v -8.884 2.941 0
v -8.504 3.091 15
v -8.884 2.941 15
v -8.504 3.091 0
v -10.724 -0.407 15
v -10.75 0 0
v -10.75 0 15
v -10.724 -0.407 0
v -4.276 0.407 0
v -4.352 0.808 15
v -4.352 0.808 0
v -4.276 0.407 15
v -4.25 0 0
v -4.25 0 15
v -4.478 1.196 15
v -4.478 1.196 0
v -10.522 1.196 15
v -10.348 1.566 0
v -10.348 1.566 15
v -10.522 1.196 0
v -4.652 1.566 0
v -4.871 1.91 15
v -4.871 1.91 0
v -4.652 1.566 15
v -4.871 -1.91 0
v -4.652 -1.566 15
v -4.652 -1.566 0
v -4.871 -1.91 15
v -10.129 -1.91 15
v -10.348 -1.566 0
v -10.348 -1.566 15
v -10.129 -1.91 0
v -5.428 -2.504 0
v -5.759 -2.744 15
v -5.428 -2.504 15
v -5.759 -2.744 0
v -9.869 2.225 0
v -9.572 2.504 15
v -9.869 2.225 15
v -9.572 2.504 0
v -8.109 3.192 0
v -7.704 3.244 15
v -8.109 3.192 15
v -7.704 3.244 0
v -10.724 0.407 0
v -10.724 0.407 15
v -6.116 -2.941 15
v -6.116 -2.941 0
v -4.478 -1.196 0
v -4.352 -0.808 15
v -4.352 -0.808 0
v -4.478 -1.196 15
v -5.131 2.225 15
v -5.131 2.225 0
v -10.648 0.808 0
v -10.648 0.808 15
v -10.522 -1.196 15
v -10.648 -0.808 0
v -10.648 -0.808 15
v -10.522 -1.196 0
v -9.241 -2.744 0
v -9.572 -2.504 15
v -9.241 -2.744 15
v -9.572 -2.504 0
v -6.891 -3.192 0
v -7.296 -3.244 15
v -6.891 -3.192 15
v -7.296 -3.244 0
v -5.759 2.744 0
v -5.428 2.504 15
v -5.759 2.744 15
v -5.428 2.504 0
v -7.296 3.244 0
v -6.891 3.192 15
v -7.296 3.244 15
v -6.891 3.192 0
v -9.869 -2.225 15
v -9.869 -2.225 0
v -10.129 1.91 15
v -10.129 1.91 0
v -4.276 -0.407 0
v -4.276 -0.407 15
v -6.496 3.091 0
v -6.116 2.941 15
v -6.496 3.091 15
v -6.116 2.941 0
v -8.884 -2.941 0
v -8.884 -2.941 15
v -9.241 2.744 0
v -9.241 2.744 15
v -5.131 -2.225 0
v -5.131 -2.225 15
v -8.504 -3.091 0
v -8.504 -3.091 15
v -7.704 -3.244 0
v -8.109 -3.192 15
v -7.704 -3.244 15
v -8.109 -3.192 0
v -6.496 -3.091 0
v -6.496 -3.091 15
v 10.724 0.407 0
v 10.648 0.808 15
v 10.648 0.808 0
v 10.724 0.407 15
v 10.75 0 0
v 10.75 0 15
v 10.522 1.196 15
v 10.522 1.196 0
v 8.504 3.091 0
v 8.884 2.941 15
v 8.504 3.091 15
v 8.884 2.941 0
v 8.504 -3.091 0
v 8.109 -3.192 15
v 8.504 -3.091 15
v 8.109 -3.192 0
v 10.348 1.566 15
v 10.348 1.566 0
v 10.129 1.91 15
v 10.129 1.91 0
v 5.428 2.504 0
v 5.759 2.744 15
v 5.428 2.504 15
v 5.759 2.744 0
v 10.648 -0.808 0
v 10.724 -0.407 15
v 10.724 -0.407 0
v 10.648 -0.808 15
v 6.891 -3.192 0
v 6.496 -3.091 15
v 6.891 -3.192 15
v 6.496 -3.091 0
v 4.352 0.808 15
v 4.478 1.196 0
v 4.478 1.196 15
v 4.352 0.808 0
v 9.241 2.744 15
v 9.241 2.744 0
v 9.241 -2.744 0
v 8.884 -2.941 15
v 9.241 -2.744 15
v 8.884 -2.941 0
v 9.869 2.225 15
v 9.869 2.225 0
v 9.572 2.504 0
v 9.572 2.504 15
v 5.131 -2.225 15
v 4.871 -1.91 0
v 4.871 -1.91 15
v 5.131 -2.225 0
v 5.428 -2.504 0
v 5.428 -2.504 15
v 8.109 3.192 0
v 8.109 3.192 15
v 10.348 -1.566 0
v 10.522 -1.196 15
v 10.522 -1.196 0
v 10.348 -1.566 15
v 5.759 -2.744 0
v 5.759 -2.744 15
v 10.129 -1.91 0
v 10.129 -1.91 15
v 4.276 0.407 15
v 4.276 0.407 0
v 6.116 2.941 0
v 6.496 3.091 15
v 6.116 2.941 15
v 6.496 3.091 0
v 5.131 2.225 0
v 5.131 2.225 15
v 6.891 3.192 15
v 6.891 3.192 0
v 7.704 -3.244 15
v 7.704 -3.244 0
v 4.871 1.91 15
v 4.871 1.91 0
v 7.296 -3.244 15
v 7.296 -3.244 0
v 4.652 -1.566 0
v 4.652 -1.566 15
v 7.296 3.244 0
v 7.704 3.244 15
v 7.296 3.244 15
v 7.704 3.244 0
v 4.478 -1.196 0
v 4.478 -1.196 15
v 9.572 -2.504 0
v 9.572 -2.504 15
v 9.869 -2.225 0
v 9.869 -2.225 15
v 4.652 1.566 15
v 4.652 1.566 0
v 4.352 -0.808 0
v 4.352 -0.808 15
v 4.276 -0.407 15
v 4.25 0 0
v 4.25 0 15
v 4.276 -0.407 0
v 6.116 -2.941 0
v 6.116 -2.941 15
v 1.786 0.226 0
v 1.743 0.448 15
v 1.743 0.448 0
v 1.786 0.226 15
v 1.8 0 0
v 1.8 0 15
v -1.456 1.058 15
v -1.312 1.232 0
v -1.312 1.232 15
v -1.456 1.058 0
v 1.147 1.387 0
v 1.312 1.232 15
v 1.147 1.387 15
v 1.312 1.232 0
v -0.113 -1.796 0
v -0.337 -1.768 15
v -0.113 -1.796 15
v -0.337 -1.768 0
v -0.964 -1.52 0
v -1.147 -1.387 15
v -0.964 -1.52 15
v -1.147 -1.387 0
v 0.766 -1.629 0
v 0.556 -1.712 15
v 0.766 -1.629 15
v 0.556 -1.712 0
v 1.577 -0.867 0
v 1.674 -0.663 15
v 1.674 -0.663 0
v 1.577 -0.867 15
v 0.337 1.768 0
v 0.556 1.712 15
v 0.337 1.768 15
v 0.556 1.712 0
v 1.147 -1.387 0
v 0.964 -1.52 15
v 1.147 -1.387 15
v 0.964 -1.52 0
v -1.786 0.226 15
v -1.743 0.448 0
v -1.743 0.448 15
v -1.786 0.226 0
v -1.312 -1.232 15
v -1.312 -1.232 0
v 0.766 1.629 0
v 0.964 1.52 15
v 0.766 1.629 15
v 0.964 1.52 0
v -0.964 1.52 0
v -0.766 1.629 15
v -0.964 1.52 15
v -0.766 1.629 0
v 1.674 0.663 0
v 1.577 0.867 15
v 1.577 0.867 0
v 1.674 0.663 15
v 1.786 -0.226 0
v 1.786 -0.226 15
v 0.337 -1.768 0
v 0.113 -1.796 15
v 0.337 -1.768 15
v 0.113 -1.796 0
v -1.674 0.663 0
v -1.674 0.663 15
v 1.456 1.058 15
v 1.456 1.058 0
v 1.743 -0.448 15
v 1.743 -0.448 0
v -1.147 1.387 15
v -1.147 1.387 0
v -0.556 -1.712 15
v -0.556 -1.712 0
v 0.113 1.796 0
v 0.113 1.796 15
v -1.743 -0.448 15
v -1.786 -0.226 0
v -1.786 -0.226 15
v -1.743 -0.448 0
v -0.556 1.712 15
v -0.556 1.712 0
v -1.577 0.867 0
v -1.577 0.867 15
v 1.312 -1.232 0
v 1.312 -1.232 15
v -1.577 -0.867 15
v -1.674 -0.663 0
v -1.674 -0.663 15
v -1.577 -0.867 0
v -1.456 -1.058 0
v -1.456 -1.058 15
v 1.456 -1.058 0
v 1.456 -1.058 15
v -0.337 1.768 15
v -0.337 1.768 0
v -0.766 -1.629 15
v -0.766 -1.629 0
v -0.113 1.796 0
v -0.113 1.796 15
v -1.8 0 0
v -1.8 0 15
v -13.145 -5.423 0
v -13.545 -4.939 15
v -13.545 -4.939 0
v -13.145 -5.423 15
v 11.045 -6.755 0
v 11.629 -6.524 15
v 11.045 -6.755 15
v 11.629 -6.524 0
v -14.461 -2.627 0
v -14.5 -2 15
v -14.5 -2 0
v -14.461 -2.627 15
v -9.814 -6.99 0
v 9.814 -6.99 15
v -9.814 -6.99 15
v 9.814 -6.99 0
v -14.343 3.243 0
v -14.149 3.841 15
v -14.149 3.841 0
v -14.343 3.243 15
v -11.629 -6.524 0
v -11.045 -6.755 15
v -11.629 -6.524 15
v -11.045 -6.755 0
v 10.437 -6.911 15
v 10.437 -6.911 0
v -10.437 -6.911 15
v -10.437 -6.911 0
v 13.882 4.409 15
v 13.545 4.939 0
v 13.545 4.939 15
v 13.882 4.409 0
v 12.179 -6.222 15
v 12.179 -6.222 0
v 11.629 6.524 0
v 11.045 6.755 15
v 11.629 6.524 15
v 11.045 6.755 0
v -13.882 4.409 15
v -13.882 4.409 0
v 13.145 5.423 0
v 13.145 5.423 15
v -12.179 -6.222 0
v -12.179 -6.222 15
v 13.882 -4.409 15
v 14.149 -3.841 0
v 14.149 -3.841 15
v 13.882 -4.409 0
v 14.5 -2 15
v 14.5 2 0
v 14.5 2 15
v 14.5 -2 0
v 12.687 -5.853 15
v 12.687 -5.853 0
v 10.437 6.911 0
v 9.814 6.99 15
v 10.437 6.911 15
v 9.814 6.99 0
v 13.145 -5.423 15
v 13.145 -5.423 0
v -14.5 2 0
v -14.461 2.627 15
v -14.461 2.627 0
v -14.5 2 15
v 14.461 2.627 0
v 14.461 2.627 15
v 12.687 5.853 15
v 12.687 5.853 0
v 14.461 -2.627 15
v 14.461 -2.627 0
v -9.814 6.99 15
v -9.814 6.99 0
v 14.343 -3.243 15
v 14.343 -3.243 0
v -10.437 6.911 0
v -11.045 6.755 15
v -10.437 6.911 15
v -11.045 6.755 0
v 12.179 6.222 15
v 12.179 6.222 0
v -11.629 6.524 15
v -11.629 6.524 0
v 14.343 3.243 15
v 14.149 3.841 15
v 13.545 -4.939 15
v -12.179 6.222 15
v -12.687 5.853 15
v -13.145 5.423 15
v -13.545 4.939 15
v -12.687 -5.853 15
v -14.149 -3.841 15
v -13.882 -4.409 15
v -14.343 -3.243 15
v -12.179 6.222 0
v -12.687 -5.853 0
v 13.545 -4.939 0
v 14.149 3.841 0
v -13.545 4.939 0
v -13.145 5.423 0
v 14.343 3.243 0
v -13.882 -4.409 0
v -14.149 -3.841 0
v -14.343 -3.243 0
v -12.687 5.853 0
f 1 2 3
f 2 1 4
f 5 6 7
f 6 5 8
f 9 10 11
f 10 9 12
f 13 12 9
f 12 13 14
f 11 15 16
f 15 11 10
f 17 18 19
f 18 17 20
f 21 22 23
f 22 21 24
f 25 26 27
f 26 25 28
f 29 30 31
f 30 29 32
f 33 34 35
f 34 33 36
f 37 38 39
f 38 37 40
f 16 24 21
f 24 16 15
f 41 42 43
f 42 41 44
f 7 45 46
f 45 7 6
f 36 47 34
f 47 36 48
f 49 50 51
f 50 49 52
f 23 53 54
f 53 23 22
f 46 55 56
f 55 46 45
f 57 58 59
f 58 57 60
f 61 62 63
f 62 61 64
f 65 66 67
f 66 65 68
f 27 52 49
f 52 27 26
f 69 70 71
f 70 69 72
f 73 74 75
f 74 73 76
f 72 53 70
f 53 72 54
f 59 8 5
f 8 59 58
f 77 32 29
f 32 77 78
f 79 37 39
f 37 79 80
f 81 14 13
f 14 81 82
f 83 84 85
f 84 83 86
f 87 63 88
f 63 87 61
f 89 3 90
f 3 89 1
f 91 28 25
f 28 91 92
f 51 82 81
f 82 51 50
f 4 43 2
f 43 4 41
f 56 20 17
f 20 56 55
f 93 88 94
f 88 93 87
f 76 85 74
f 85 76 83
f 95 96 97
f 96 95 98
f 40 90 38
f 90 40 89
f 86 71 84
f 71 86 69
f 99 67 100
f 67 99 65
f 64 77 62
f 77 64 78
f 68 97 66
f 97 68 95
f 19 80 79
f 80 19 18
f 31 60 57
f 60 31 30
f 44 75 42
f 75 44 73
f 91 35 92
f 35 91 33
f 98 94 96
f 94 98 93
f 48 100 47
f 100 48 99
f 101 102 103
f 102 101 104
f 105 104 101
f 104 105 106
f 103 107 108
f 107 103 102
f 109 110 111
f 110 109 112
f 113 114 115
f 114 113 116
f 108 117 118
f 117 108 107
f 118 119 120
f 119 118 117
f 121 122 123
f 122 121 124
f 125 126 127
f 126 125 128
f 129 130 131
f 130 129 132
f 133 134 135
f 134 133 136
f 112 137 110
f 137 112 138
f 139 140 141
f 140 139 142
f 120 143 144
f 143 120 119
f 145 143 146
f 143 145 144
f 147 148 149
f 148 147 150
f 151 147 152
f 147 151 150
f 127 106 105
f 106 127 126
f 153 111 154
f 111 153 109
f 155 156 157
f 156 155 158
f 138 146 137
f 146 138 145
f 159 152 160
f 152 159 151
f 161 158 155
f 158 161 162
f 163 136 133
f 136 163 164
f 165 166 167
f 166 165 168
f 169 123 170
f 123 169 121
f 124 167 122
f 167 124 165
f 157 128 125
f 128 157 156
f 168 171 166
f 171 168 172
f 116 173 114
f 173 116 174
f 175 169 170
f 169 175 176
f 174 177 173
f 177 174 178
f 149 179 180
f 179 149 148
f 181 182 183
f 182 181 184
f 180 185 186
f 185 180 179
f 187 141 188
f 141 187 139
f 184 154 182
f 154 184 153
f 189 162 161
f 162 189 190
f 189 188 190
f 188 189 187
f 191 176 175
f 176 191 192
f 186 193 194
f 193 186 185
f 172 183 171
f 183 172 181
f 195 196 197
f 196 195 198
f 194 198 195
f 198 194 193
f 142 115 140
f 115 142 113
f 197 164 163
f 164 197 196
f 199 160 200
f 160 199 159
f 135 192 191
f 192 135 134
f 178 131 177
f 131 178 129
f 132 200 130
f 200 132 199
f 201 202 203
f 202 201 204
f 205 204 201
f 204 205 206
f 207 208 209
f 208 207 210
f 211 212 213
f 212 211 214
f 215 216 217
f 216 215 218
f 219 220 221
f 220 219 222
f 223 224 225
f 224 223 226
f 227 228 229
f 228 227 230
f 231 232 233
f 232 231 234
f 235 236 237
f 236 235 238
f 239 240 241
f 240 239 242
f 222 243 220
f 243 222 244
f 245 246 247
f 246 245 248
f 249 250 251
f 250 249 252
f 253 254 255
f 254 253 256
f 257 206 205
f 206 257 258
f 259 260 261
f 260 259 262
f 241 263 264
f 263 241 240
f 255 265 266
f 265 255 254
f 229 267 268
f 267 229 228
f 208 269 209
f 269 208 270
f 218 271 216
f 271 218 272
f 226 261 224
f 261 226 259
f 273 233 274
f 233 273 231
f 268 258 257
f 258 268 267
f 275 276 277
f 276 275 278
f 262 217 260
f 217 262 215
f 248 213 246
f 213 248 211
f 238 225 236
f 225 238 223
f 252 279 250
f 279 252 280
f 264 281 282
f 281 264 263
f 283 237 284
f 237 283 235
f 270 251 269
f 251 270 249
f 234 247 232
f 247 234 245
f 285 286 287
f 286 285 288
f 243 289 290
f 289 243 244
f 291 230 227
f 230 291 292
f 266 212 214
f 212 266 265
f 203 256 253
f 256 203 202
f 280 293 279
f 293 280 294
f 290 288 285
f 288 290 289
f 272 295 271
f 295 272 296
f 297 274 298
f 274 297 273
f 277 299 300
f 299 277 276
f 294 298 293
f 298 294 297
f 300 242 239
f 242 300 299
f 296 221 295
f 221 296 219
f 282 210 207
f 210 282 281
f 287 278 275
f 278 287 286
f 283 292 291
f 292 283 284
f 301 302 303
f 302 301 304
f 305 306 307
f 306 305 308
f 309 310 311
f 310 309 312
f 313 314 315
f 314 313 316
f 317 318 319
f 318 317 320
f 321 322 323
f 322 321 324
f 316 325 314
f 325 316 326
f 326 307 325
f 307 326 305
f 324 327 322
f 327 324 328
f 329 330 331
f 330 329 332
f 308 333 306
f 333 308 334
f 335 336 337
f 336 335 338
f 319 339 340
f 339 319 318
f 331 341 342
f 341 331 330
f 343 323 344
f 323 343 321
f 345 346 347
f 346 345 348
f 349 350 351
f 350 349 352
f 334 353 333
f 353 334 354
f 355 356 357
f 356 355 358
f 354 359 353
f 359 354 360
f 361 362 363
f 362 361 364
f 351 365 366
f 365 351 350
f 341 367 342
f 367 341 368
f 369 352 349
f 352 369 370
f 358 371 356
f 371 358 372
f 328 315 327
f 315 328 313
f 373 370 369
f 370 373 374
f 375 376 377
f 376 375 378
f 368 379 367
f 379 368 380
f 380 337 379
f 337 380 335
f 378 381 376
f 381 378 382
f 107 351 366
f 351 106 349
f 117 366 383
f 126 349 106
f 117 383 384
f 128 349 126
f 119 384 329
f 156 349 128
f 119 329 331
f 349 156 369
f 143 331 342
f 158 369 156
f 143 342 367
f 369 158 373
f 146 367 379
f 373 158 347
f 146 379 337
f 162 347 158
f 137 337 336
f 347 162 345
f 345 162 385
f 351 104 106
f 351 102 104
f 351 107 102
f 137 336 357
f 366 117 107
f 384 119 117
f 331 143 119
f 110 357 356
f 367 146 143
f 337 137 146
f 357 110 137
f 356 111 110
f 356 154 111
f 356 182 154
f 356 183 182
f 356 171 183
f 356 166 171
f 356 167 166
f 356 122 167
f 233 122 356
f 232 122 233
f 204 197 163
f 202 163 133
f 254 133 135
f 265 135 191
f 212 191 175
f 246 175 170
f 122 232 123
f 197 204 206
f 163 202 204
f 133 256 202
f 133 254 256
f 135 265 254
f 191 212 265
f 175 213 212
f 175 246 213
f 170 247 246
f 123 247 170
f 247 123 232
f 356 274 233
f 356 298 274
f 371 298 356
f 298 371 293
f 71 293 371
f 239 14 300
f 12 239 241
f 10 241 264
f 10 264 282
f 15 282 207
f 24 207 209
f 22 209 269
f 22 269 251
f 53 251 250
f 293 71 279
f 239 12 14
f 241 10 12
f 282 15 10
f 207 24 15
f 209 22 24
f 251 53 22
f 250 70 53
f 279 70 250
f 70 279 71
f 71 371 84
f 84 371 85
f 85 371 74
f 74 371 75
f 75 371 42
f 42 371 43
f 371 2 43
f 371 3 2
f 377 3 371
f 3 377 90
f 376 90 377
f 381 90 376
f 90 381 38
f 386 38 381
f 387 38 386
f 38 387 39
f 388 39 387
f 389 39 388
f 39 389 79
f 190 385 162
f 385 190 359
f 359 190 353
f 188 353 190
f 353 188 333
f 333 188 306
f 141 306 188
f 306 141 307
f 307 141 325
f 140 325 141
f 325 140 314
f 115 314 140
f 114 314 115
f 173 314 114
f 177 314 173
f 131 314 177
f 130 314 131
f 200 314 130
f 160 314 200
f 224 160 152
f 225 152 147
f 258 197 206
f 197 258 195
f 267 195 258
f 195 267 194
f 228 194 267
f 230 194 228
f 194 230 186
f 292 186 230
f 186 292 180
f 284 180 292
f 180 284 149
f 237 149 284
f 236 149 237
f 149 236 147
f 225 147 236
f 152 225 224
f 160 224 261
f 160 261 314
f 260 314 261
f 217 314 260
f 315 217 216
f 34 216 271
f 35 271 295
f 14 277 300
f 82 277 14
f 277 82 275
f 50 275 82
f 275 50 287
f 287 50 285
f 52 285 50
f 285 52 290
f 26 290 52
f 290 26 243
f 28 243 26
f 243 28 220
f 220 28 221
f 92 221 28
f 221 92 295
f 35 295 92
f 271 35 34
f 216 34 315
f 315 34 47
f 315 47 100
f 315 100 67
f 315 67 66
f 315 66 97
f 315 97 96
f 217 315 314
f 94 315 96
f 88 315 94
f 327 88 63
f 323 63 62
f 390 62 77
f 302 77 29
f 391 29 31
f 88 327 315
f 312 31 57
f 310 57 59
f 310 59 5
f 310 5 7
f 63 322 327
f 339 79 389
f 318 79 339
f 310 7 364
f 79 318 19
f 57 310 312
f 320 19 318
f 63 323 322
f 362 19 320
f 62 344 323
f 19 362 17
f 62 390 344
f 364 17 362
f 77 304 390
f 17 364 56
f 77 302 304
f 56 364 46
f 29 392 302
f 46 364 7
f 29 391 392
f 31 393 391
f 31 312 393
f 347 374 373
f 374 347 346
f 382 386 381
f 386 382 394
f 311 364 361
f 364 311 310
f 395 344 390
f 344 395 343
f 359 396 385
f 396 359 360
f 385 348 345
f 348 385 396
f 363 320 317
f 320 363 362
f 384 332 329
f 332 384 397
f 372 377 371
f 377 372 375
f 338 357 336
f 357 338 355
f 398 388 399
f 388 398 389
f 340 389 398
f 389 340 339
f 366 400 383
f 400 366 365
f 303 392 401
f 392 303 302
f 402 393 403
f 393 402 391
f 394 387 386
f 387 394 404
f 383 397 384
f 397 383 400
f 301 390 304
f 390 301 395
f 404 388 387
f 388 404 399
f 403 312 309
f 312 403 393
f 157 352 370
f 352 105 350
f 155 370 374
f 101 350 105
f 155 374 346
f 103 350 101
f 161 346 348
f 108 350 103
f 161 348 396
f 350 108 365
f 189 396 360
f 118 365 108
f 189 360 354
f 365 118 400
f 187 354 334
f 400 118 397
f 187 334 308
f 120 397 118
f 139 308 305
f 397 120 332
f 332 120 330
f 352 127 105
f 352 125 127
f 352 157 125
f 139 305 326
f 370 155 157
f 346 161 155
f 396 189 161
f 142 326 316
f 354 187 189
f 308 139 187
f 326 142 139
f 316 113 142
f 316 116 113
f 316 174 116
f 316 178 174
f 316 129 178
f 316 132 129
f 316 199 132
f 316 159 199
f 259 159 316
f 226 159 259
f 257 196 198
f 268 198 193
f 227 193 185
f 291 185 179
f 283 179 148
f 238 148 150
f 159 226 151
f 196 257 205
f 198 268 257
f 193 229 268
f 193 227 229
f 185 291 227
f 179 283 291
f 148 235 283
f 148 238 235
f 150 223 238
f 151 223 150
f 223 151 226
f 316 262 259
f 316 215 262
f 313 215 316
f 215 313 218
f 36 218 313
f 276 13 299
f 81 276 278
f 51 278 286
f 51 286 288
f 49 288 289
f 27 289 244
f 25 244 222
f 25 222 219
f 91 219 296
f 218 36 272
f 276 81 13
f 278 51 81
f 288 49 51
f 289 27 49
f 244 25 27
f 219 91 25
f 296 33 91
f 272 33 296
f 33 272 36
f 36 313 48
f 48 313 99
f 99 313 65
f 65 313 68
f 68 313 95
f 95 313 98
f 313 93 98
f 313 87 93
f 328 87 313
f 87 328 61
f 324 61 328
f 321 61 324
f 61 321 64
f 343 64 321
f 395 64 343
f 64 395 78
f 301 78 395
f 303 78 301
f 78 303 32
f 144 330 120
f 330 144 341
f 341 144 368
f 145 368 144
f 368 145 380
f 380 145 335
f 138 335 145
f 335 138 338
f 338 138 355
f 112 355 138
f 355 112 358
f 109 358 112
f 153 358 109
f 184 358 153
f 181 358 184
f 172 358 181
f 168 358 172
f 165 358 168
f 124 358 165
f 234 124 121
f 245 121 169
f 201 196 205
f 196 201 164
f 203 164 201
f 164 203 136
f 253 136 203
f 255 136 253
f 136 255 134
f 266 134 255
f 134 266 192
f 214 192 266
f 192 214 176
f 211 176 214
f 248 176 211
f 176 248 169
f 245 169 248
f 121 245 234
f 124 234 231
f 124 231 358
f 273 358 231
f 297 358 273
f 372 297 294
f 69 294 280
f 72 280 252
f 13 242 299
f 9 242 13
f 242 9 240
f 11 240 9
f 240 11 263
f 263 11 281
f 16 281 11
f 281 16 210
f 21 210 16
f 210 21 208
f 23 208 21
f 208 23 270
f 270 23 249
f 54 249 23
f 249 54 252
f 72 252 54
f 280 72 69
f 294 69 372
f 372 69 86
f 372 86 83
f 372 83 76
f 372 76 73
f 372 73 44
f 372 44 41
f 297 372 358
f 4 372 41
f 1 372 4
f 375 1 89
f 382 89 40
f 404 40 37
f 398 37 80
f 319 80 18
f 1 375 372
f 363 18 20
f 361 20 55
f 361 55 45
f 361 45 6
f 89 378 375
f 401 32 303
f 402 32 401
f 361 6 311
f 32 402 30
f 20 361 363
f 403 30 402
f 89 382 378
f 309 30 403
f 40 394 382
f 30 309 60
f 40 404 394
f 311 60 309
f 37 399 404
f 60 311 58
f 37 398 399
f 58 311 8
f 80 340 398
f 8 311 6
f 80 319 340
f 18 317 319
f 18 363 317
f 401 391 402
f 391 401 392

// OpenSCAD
$fn = 50;


difference() {
	union() {
		*color(alpha = 1.0000000000, c = "gray") {
			translate(v = [0, 7, 0]) {
				linear_extrude(height = 1) {
					text(font = "Arial:style=Bold", halign = "center", size = 4.5000000000, text = "COMMENT plate main", valign = "center");
				}
			}
		}
		*color(alpha = 1.0000000000, c = "gray") {
			translate(v = [0, 14, 0]) {
				linear_extrude(height = 1) {
					text(font = "Arial:style=Bold", halign = "center", size = 4.5000000000, text = "COMMENT description oobb_plate_shape_p_type_15_depth_2_width_1_height_15_thickness_true_both_holes", valign = "center");
				}
			}
		}
		hull() {
			translate(v = [-9.5000000000, 2.0000000000, 0]) {
				cylinder(h = 15, r = 5);
			}
			translate(v = [9.5000000000, 2.0000000000, 0]) {
				cylinder(h = 15, r = 5);
			}
			translate(v = [-9.5000000000, -2.0000000000, 0]) {
				cylinder(h = 15, r = 5);
			}
			translate(v = [9.5000000000, -2.0000000000, 0]) {
				cylinder(h = 15, r = 5);
			}
		}
	}
	union() {
		*color(alpha = 1.0000000000, c = "gray") {
			translate(v = [0, 7, 0]) {
				linear_extrude(height = 1) {
					text(font = "Arial:style=Bold", halign = "center", size = 4.5000000000, text = "COMMENT holes main", valign = "center");
				}
			}
		}
		*color(alpha = 1.0000000000, c = "gray") {
			translate(v = [0, 14, 0]) {
				linear_extrude(height = 1) {
					text(font = "Arial:style=Bold", halign = "center", size = 4.5000000000, text = "COMMENT description oobb_holes_shape_n_type_2_width_1_height_15_thickness_true_both_holes", valign = "center");
				}
			}
		}
		translate(v = [-7.5000000000, 0.0000000000, 0]) {
			translate(v = [0, 0, -50]) {
				cylinder(h = 100, r = 3.2500000000);
			}
		}
		translate(v = [7.5000000000, 0.0000000000, 0]) {
			translate(v = [0, 0, -50]) {
				cylinder(h = 100, r = 3.2500000000);
			}
		}
		translate(v = [-7.5000000000, 0.0000000000, 0]) {
			translate(v = [0, 0, -50]) {
				cylinder(h = 100, r = 1.8000000000);
			}
		}
		translate(v = [0, 0, -50]) {
			cylinder(h = 100, r = 1.8000000000);
		}
		translate(v = [7.5000000000, 0.0000000000, 0]) {
			translate(v = [0, 0, -50]) {
				cylinder(h = 100, r = 1.8000000000);
			}
		}
	}
}
